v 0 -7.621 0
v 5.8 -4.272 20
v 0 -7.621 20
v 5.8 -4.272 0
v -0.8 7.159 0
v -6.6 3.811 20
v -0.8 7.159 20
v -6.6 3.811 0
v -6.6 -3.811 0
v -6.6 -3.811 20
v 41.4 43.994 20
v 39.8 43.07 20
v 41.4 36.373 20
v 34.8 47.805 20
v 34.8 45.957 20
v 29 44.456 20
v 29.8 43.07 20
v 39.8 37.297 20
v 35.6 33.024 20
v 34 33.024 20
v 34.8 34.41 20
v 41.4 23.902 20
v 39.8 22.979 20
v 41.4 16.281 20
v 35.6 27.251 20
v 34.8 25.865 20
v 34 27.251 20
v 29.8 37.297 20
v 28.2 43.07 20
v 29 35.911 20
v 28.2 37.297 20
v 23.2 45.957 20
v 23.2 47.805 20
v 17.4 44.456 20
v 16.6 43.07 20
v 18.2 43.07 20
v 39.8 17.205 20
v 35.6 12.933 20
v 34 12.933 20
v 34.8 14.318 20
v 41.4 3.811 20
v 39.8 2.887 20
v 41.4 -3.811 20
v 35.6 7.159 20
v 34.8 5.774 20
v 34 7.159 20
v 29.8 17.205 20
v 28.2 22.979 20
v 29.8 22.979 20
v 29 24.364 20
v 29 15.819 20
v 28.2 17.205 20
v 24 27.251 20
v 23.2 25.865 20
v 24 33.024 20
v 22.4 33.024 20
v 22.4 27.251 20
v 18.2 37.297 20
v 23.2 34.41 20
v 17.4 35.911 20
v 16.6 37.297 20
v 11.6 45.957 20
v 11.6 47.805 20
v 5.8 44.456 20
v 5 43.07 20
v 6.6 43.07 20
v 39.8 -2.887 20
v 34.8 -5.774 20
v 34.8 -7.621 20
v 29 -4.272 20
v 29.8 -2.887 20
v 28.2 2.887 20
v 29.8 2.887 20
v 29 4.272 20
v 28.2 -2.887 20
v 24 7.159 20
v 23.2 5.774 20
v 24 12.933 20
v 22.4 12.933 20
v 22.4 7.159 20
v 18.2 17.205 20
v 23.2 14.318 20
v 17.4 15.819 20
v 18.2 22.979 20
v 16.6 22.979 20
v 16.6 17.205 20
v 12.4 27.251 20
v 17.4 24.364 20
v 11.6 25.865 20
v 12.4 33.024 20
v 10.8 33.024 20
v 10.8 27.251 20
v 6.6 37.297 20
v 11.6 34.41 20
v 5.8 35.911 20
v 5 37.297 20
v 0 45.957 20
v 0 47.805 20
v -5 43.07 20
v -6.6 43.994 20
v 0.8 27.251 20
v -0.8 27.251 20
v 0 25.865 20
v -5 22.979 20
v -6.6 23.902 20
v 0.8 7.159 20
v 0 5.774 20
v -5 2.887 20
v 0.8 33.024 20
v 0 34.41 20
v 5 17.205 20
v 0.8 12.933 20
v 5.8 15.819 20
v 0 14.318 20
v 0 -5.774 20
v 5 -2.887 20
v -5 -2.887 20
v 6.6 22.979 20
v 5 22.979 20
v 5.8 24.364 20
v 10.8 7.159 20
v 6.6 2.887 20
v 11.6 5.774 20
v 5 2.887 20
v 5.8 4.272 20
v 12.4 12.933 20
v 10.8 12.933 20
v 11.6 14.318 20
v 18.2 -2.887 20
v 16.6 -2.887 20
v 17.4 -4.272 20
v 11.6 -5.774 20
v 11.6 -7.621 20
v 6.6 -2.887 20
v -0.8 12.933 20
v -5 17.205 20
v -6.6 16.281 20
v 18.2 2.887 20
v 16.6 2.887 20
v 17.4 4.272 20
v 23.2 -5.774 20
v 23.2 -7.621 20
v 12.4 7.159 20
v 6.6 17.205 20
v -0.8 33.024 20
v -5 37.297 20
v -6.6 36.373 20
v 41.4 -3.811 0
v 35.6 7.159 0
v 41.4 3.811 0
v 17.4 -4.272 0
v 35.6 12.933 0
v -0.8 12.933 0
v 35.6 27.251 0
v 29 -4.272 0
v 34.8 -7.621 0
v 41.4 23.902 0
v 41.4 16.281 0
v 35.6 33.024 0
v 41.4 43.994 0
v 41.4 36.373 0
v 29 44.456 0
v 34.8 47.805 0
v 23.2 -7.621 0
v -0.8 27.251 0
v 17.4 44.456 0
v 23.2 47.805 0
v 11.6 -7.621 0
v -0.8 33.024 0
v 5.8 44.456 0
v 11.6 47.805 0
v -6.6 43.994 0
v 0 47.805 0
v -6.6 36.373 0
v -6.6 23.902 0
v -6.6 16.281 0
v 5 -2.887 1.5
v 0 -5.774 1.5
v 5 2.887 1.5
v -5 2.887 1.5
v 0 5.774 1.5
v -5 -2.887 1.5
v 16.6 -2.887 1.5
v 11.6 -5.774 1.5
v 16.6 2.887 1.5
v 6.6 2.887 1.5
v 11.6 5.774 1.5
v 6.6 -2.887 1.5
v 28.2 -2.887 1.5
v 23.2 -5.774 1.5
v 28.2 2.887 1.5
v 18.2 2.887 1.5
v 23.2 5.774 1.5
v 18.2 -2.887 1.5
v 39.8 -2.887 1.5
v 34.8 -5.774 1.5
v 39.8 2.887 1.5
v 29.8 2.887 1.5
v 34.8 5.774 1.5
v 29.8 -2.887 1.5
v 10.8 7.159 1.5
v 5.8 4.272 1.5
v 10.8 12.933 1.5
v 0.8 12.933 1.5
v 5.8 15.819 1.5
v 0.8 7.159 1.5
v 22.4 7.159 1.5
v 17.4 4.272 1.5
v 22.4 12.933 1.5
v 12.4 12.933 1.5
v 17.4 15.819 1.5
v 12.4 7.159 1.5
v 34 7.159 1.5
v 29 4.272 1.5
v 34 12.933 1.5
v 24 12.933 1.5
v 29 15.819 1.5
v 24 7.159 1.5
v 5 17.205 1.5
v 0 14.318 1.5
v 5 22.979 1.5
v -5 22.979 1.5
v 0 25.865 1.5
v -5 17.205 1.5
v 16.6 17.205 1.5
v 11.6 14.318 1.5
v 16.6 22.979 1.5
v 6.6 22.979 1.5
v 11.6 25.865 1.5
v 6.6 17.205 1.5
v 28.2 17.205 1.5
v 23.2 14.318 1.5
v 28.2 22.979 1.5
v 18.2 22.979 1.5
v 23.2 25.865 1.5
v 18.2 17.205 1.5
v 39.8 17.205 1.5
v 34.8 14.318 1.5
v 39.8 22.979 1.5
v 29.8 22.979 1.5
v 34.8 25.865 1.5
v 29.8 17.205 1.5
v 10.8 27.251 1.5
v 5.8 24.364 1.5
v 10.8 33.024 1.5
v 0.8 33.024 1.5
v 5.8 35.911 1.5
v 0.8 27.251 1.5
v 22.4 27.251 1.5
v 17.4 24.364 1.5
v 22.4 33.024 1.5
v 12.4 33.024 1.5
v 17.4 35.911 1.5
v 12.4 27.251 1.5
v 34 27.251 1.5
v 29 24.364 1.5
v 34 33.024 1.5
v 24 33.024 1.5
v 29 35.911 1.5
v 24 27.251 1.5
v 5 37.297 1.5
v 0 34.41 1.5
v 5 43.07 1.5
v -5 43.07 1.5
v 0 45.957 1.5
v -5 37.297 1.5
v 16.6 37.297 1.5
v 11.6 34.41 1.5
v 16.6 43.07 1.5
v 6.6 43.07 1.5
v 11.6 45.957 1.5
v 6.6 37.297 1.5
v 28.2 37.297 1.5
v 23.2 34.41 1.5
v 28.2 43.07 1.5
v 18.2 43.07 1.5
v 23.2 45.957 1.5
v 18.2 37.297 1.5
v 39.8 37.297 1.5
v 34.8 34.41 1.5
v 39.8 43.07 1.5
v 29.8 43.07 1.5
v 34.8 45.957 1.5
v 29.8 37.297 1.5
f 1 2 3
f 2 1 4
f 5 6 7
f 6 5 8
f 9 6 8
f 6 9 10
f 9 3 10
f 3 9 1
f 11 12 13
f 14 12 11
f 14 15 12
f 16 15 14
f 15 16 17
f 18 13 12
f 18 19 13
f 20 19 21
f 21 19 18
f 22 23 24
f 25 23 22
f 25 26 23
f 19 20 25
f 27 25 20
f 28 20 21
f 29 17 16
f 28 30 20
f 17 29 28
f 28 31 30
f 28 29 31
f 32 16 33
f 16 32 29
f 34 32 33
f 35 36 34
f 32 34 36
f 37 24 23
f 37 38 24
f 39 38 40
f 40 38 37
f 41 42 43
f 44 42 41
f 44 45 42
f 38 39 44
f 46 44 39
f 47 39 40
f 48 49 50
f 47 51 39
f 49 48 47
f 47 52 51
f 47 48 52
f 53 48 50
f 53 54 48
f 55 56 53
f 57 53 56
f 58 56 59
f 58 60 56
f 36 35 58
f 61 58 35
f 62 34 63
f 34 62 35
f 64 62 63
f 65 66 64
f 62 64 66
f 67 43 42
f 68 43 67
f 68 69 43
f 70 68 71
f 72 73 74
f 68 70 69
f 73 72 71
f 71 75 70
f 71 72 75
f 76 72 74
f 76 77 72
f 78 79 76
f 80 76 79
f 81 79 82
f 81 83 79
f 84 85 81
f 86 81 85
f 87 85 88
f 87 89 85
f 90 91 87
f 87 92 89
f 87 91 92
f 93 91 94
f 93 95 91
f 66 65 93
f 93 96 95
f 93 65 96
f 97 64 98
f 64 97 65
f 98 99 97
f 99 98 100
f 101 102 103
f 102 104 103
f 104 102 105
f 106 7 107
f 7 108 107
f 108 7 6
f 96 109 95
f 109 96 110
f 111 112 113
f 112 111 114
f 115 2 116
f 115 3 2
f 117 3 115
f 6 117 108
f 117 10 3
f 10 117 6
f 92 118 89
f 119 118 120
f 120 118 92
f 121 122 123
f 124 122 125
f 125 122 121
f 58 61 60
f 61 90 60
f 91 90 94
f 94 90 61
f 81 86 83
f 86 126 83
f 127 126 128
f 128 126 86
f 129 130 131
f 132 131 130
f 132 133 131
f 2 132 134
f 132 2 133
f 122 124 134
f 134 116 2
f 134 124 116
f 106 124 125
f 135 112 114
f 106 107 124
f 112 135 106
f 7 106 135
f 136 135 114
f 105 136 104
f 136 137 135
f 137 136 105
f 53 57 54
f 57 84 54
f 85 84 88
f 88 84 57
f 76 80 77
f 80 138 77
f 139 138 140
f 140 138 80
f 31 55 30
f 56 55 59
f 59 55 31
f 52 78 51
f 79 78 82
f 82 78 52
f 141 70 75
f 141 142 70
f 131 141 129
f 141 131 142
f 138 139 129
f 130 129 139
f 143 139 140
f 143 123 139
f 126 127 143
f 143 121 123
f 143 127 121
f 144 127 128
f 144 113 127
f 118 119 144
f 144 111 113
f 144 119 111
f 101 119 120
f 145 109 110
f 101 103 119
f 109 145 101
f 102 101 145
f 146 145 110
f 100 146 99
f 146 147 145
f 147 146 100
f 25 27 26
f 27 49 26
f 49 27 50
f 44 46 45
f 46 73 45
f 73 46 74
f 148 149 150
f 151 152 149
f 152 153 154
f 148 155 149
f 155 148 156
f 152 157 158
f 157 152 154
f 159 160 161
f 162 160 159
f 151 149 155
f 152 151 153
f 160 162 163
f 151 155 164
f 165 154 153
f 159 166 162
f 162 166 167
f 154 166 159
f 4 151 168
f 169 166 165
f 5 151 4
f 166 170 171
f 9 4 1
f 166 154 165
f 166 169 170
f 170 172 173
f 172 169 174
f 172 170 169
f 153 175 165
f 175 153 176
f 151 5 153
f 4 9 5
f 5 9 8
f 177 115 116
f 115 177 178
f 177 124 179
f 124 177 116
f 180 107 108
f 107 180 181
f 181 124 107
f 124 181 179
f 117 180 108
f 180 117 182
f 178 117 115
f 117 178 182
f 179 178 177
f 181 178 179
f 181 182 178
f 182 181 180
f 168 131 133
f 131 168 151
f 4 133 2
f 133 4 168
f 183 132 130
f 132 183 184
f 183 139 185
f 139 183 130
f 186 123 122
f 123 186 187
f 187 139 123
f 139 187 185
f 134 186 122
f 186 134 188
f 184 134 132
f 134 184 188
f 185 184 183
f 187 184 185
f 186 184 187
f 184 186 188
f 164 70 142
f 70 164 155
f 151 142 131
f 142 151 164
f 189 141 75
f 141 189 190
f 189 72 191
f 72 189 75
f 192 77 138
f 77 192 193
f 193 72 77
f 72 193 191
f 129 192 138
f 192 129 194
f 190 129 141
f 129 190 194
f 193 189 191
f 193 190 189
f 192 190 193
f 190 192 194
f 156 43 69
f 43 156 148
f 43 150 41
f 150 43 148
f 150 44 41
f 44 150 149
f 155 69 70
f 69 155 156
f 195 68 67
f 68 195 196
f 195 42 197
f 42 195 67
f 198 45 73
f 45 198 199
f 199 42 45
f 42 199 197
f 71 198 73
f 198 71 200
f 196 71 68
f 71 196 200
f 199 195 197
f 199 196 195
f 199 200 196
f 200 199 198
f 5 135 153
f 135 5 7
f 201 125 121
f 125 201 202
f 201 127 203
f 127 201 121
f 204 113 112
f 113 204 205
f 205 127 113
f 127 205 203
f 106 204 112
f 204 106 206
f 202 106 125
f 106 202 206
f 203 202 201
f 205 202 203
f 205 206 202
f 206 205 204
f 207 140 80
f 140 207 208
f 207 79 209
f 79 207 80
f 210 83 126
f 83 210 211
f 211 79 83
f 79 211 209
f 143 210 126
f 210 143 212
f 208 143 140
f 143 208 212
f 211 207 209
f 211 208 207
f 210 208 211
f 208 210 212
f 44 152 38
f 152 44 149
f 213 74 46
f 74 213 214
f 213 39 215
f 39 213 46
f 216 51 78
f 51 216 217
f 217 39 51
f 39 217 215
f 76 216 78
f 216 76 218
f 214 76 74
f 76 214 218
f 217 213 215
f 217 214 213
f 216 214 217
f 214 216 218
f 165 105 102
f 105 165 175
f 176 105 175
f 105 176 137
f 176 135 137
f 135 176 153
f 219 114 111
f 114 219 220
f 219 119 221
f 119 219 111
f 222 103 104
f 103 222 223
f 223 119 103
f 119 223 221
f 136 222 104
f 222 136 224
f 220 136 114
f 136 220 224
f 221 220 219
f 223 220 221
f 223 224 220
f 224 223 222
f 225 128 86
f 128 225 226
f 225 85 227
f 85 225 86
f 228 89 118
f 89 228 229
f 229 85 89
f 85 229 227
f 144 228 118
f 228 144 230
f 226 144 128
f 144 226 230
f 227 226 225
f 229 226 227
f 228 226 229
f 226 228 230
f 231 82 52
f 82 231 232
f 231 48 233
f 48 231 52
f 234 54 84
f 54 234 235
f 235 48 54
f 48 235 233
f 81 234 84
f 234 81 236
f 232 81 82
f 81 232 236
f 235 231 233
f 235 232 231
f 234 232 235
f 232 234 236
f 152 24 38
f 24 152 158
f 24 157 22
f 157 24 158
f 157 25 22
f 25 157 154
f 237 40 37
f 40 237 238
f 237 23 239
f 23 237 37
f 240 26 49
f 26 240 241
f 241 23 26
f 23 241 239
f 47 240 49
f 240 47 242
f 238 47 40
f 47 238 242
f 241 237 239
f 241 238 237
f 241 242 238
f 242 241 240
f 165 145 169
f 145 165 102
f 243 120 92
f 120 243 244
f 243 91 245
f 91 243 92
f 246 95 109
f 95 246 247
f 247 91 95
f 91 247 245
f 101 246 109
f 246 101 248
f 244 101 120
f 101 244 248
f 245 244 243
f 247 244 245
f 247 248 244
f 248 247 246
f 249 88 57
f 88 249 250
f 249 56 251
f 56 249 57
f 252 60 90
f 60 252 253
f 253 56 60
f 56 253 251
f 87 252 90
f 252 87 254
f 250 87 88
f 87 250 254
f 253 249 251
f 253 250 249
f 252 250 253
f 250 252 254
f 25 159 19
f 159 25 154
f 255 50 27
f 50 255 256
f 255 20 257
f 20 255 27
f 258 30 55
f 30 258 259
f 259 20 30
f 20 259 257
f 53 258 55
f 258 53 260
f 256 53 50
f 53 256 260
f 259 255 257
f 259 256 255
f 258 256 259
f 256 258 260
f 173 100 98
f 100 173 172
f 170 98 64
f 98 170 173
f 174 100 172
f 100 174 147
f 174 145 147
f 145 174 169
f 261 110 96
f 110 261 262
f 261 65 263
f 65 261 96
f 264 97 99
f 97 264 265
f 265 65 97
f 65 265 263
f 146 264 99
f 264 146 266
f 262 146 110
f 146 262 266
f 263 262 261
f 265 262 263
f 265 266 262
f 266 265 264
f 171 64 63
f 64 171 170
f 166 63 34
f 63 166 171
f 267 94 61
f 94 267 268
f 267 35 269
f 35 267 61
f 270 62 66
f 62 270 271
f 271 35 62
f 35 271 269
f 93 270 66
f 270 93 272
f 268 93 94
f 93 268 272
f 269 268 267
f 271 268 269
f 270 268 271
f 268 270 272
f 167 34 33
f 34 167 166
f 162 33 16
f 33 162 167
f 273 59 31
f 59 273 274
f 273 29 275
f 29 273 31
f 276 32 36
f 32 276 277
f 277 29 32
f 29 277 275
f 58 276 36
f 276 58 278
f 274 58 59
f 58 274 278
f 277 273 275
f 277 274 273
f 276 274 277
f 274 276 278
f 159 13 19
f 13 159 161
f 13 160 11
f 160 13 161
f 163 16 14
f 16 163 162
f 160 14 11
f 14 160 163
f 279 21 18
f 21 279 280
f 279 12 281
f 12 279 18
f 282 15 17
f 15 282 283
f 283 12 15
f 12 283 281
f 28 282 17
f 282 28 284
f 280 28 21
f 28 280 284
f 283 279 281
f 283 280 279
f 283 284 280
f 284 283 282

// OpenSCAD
//Draw a Honeycomb grid based on 8 variables
//By: David Bunch 3/12/15

//Made more customizable 8/24/2016

//1. Face to Face Inside Distance of Honeycomb
ID = 10;            //Diameter from Face to Face or inscribed circle

//2. Total Height of Honeycomb
Ht = 20;            //Height of Outside of Honeycomb
                    //Height inside will be = Ht-Thk

//3. Thickness of wall between Honeycombs
W_Thk = 1.6;        //Thickness of Walls

//4. Thickness of Base of Honeycomb
B_Thk = 1.5;        //Thicknes of Base

//5. Number of Rows of Honeycomb
Rows = 5;           //[1:20]

//6. Number of Columns of Honeycomb
Cols = 4;           //[1:20]

//7. Honeycomb Pattern Style
P_Style = 0;        //[0:2]
                    //0= Every other row has 1 less Containers
                    //1 = Every other row has same number of containers
                    //2 = Every other row has 1 more container
//8. Open Tray (Only works with P_Style = 0)
Open_Tray = 0;           //[0:1]
                    
/* [Hidden] */

W_Thk2 = W_Thk / 2;                 //Half the Wall Thickness
OD_Face = ID + W_Thk + W_Thk;       //Outside Face to Face Dimension
OD_Face2 = OD_Face / 2;             //Half Outside Face to Face Dimension
Face2 = tan(30) * OD_Face2;
Yoffset = (OD_Face2 - W_Thk2) / tan(30);  //Y distance between Hex in Next Row
Xoffset = OD_Face2 - W_Thk2;        //X distance between Hex in Next Row
Rad = OD_Face2 / cos(30);           //Radius of Outside Face Width
RadID = (ID / 2) / cos(30);         //Radius of Inside Face Width
RadID2 = RadID / 2;
OD_W = (W_Thk * 2) / cos(30);       //Diameter of Wall Thickness
Rad_W = OD_W / 2;                   //Radius of Wall Thickness
Rad_W2 = Rad_W / 2;                 //Half the Radius Wall Thickness
X_Space = Xoffset * 2;
LenCut = (Cols - 1) * X_Space;
WidCut = (Rows) * Yoffset - W_Thk - RadID2;

echo(ID = ID);
echo(Ht = Ht);
echo(W_Thk = W_Thk);
echo(B_Thk = B_Thk);
echo(Rows = Rows);
echo(Cols = Cols);
echo(OD_Face = OD_Face);
echo(OD_Face2 = OD_Face2);
echo(Face2 = Face2);
echo(Xoffset = Xoffset);
echo(Yoffset = Yoffset);
echo(Rad = Rad);
echo(RadID = RadID);
echo(RadID2 = RadID2);
echo(OD_W = OD_W);
echo(Rad_W = Rad_W);
echo(WidCut = WidCut);
module Hex()
{
    rotate([0,0,30])
    difference()
    {
        cylinder(d=Rad*2,h=Ht,$fn=6);
        if (B_Thk > 0)
        {
            translate([0,0,B_Thk])
            cylinder(d=RadID * 2,h=Ht+2,$fn=6);
        } else
        {
            translate([0,0,-1])
            cylinder(d=RadID * 2,h=Ht + 2,$fn=6);
        }
    }
}
module WallHex()
{
    rotate([0,0,30])
    cylinder(d=OD_W,h=Ht + 2,$fn=6);
}
module HexRowCol()
{
    for (j=[0:Rows - 1])
    {
        A_Odd = j % 2;
        translate([(j % 2) * Xoffset,j * Yoffset,0])
        {
            if (P_Style == 2 && A_Odd == 1)
            {
                translate([-X_Space,0,0])
                Hex();              //Add extra hex to the left on Odd Rows
            }
            for (i=[0:Cols - 1])
            {
                translate([X_Space * i,0,0])
                Hex();
            }
        }
    }
}
module HexRowCol0()
{
    for (j=[0:Rows - 1])
    {
        A_Odd = j % 2;
        //echo(A_Odd = A_Odd);
        translate([(j % 2) * Xoffset,j * Yoffset,0])
        for (i=[0:Cols - 1])
        {
            if (j%2 == 0)
            {
                translate([X_Space * i,0,0])
                Hex();
            } else {
                if (i != (Cols - 1))
                {
                    translate([X_Space * i,0,0])
                    Hex();
                } 
            }
        }
    } 
}
module TrayCut()
{
    for (j=[0:Rows - 1])
    {
        A_Odd = j % 2;
        translate([(j % 2) * Xoffset,j * Yoffset,0])
        {
            if (A_Odd == 0)
            {
                if (j == 0)
                {
                    translate([0,-RadID2,B_Thk])
                    cube([LenCut,RadID + RadID2,Ht + 2]);
                } else  if (j == (Rows - 1))
                {
                    translate([0,-RadID,B_Thk])
                    cube([LenCut,RadID + RadID2,Ht + 2]);
                } else
                {
                    translate([0,-RadID,B_Thk])
                    cube([LenCut,RadID + RadID,Ht + 2]);
                }
                if (j < (Rows - 1))
                {
                translate([W_Thk,RadID - Rad_W2,B_Thk])
                WallHex();                 //Top Left Cleanup of this Row
                translate([LenCut - W_Thk,RadID - Rad_W2,B_Thk])
                WallHex();                 //Top Right Cleanup of this Row
                }
            } else
            {
                translate([W_Thk2 - Xoffset,RadID - Rad_W2 + W_Thk2,B_Thk])
                WallHex();      //Bottom Left cleanup of this Row
            
                translate([LenCut - W_Thk2 - Xoffset,RadID - Rad_W2 + W_Thk2,B_Thk])
                WallHex();      //Bottom Right cleanup of this Row
            }
        }
    } 
    translate([W_Thk2,-RadID2,B_Thk])
    cube([LenCut - W_Thk,WidCut,Ht + 2]);
}
difference()
{
    if (P_Style == 0)
    {
        HexRowCol0();

    } else
    {
        HexRowCol();
    }
    if (P_Style == 0 && Open_Tray == 1)
    {
        TrayCut();
    }
//Uncomment the next 2 lines to cut section thru 1st Hex
//    translate([-ID,-ID,-1])
//    cube([ID,ID,Ht + 2]);
}
